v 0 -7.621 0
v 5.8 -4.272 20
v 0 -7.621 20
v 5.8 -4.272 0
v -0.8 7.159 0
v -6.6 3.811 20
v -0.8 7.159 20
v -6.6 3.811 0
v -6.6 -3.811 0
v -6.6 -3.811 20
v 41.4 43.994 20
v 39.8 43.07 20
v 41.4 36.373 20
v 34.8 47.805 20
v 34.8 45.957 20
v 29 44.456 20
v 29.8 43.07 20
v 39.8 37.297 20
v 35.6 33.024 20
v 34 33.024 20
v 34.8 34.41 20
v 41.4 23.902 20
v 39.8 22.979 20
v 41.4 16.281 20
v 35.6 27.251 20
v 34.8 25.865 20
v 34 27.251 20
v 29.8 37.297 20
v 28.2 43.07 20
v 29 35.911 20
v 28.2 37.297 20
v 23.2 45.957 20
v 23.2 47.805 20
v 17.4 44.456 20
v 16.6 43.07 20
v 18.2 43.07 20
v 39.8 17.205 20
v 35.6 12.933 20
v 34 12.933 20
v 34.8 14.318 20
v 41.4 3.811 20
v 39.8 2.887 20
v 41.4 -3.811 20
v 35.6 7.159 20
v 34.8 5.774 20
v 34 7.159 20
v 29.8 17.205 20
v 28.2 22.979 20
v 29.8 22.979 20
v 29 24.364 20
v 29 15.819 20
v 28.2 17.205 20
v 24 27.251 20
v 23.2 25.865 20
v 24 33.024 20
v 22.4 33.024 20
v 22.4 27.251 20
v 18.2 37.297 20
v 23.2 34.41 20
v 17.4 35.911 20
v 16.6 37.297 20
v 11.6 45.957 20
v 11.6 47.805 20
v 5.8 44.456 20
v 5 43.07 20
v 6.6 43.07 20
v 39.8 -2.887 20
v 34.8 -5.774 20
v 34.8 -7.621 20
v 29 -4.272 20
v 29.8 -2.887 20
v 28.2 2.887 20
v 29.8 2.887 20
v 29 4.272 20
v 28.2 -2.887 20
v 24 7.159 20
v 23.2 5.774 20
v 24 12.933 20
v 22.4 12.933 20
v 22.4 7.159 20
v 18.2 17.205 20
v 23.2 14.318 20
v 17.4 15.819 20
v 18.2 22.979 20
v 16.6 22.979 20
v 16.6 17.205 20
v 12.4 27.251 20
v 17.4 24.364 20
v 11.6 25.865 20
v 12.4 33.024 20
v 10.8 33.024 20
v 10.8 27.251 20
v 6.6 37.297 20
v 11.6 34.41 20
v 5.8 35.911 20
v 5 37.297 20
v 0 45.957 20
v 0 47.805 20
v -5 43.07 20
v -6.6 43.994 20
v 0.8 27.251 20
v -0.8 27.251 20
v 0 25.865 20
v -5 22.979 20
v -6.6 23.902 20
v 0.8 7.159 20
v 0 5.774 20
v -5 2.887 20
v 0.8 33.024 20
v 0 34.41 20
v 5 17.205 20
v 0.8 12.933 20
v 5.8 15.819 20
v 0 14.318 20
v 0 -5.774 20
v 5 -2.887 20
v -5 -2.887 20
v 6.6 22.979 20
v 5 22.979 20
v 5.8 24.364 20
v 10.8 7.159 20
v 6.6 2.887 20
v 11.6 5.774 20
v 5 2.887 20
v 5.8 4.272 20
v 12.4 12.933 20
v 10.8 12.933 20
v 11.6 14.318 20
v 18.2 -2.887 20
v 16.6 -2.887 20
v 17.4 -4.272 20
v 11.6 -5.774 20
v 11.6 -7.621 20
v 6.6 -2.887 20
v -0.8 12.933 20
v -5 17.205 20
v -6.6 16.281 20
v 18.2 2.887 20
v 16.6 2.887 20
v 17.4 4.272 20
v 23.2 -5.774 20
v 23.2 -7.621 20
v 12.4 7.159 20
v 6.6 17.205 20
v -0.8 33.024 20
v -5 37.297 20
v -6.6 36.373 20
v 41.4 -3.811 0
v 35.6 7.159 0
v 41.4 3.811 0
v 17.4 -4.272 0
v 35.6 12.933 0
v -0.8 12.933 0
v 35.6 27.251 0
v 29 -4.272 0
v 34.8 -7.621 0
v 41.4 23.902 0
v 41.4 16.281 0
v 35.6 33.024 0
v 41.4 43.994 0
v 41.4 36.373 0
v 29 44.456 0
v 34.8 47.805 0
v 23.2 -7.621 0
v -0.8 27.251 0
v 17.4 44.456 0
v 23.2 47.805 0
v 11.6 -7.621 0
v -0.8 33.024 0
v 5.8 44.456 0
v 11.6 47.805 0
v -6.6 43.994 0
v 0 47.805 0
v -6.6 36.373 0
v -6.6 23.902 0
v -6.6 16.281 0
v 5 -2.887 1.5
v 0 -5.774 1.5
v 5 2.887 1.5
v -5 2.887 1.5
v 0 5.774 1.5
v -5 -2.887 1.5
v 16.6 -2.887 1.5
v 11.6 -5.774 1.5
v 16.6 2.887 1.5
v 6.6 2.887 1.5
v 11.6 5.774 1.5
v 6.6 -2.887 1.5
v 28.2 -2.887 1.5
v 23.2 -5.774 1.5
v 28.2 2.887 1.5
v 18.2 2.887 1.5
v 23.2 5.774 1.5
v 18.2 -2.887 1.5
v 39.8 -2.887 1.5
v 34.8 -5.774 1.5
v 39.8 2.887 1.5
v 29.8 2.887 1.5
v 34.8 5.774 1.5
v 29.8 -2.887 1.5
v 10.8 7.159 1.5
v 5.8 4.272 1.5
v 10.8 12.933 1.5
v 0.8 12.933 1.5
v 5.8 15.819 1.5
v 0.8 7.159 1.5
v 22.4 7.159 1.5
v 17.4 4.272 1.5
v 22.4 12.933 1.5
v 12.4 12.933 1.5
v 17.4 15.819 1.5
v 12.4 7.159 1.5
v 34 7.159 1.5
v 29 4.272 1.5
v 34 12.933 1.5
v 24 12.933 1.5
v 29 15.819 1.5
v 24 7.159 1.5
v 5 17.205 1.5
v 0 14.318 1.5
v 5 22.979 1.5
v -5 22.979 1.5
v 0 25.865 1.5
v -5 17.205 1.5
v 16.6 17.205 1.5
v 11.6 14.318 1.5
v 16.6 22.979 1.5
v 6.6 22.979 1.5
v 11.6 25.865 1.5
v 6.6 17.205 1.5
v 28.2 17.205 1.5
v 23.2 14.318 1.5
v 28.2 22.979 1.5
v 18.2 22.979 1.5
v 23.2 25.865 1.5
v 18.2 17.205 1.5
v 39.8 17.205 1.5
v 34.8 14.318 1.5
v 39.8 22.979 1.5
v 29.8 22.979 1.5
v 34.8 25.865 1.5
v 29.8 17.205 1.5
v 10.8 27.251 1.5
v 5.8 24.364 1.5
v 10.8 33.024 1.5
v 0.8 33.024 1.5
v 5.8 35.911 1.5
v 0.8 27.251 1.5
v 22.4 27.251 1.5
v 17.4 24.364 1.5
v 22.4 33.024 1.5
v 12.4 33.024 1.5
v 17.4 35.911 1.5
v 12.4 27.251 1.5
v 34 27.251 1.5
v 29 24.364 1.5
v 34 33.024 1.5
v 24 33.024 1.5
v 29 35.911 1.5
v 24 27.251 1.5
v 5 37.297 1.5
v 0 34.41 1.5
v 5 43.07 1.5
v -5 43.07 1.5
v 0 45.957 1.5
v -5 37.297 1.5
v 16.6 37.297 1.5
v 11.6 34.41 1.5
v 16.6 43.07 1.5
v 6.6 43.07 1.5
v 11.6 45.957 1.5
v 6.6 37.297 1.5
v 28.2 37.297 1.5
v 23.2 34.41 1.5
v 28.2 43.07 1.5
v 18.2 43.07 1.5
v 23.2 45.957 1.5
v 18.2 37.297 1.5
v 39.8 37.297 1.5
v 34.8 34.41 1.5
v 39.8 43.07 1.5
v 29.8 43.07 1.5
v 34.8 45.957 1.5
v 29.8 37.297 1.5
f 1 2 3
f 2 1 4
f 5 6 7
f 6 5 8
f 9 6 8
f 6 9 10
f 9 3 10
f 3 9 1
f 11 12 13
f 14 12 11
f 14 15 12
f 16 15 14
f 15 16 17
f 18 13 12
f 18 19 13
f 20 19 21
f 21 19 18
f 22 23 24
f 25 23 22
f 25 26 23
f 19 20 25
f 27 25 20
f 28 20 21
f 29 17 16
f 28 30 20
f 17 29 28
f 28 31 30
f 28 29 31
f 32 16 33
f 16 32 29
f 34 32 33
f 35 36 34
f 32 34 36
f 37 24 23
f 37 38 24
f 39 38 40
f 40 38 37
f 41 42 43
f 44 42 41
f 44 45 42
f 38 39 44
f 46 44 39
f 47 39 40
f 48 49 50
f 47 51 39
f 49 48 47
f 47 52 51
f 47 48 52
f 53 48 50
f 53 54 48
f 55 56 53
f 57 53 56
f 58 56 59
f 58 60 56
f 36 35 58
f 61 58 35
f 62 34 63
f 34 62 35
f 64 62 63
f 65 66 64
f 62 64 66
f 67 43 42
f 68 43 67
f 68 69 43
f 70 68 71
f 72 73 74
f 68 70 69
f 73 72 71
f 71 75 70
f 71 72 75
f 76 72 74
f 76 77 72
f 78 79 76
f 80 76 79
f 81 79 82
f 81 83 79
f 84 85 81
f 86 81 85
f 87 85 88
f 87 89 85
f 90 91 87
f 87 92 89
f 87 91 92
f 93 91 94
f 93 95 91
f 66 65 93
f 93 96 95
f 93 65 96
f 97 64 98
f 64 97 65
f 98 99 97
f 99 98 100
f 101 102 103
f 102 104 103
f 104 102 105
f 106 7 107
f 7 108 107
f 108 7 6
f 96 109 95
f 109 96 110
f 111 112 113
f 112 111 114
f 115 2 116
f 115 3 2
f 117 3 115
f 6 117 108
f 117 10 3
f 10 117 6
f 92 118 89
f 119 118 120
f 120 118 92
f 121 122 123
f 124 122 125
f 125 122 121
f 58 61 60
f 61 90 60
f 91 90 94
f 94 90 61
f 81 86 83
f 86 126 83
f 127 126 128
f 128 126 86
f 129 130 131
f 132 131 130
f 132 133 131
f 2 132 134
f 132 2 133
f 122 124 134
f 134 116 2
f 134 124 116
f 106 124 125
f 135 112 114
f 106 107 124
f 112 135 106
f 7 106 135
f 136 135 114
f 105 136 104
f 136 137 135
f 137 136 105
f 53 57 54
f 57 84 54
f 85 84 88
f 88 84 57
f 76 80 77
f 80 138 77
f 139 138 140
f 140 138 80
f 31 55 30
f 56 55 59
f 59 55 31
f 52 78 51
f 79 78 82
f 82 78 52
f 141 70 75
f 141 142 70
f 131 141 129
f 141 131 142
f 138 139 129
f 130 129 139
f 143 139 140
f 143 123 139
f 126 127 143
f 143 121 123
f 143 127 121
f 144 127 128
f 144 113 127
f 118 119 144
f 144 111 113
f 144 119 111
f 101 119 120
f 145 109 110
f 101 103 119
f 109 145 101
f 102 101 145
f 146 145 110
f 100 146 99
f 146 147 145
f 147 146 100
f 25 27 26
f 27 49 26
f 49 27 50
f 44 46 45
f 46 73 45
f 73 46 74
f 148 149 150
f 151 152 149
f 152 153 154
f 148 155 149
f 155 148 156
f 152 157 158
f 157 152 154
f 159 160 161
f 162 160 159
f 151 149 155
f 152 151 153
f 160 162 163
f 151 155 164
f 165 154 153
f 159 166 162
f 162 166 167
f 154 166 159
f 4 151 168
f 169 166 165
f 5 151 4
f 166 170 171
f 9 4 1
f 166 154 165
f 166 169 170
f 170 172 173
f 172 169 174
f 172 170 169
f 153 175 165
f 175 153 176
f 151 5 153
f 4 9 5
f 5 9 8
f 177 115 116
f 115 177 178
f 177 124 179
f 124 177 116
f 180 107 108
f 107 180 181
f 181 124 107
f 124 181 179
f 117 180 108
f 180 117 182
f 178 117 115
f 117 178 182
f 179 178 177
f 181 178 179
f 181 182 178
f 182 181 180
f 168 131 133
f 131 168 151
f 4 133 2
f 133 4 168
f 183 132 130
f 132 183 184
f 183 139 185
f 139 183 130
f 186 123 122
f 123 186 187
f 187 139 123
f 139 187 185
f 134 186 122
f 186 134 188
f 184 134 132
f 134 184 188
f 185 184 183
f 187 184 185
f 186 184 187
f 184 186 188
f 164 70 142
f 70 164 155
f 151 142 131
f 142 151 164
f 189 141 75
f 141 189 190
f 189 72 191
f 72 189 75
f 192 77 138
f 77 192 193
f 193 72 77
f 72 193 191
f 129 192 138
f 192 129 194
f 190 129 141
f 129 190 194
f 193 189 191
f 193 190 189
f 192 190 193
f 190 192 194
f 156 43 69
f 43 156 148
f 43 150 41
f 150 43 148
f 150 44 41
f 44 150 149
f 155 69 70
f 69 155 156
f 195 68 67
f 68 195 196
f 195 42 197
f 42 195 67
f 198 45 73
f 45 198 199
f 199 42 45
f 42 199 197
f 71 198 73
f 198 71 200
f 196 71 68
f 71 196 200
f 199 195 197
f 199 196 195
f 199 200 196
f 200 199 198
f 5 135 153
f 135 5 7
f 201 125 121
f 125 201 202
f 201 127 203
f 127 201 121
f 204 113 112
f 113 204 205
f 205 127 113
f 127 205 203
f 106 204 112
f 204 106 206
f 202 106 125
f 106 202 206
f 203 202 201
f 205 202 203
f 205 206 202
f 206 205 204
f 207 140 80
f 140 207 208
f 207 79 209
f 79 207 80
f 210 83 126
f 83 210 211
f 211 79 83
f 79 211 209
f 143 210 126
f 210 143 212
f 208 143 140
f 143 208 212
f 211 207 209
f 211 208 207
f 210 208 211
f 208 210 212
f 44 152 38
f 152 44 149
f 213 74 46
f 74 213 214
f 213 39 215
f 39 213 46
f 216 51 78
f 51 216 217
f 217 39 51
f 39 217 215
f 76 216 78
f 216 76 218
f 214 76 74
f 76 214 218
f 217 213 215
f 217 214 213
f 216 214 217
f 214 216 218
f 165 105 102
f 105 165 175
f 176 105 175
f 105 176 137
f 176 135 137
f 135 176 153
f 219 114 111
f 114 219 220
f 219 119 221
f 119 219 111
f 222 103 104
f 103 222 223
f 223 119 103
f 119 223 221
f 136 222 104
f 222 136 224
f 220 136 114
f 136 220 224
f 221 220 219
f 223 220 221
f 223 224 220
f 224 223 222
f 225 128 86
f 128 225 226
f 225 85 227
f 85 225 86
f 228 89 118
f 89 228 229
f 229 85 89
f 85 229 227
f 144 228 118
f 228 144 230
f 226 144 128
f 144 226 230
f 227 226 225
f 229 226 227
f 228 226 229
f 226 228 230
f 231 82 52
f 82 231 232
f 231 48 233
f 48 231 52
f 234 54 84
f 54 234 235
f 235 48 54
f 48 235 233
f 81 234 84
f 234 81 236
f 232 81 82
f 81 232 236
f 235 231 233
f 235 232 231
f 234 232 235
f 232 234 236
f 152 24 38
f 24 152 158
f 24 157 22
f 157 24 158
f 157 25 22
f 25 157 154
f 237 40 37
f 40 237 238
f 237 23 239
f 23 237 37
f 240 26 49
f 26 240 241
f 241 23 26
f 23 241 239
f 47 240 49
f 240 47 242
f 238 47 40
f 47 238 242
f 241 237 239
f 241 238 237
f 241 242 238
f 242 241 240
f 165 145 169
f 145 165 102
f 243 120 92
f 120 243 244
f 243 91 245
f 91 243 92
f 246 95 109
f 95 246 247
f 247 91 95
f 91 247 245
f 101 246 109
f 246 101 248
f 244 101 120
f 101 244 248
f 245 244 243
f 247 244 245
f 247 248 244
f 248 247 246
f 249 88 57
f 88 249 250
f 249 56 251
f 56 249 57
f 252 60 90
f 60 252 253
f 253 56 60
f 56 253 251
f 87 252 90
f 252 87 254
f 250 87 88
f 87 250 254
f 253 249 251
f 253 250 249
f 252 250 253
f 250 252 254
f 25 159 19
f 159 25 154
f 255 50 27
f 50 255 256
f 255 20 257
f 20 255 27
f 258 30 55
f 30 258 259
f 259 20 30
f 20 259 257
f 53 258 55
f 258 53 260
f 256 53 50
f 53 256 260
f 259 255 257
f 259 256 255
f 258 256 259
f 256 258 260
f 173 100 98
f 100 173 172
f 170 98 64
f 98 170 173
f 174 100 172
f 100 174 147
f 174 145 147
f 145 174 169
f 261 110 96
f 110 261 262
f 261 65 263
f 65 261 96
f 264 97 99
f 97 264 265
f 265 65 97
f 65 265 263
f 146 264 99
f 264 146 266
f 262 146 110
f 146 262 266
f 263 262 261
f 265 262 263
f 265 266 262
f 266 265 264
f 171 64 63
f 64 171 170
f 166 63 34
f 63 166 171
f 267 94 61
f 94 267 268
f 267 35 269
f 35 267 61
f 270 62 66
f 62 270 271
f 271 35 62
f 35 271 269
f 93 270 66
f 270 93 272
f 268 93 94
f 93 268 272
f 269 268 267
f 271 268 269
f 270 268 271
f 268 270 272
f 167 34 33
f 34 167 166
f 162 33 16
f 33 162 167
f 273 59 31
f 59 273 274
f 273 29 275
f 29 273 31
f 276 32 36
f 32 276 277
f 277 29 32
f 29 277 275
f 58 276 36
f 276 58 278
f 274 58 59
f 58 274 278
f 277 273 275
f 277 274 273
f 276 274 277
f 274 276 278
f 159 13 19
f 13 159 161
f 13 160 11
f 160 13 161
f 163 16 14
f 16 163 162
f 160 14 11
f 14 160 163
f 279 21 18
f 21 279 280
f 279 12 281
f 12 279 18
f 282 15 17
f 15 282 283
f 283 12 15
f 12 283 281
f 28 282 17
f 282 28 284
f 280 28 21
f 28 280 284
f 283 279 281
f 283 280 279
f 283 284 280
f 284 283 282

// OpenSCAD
//Draw a Honeycomb grid based on 8 variables
//By: David Bunch 3/12/15

//Made more customizable 8/24/2016

//1. Face to Face Inside Distance of Honeycomb
ID = 10;            //Diameter from Face to Face or inscribed circle

//2. Total Height of Honeycomb
Ht = 20;            //Height of Outside of Honeycomb
                    //Height inside will be = Ht-Thk

//3. Thickness of wall between Honeycombs
W_Thk = 1.6;        //Thickness of Walls

//4. Thickness of Base of Honeycomb
B_Thk = 1.5;        //Thicknes of Base

//5. Number of Rows of Honeycomb
Rows = 5;           //[1:20]

//6. Number of Columns of Honeycomb
Cols = 4;           //[1:20]

//7. Honeycomb Pattern Style
P_Style = 0;        //[0:2]
                    //0= Every other row has 1 less Containers
                    //1 = Every other row has same number of containers
                    //2 = Every other row has 1 more container
//8. Open Tray (Only works with P_Style = 0)
Open_Tray = 0;           //[0:1]
                    
/* [Hidden] */

W_Thk2 = W_Thk / 2;                 //Half the Wall Thickness
OD_Face = ID + W_Thk + W_Thk;       //Outside Face to Face Dimension
OD_Face2 = OD_Face / 2;             //Half Outside Face to Face Dimension
Face2 = tan(30) * OD_Face2;
Yoffset = (OD_Face2 - W_Thk2) / tan(30);  //Y distance between Hex in Next Row
Xoffset = OD_Face2 - W_Thk2;        //X distance between Hex in Next Row
Rad = OD_Face2 / cos(30);           //Radius of Outside Face Width
RadID = (ID / 2) / cos(30);         //Radius of Inside Face Width
RadID2 = RadID / 2;
OD_W = (W_Thk * 2) / cos(30);       //Diameter of Wall Thickness
Rad_W = OD_W / 2;                   //Radius of Wall Thickness
Rad_W2 = Rad_W / 2;                 //Half the Radius Wall Thickness
X_Space = Xoffset * 2;
LenCut = (Cols - 1) * X_Space;
WidCut = (Rows) * Yoffset - W_Thk - RadID2;

echo(ID = ID);
echo(Ht = Ht);
echo(W_Thk = W_Thk);
echo(B_Thk = B_Thk);
echo(Rows = Rows);
echo(Cols = Cols);
echo(OD_Face = OD_Face);
echo(OD_Face2 = OD_Face2);
echo(Face2 = Face2);
echo(Xoffset = Xoffset);
echo(Yoffset = Yoffset);
echo(Rad = Rad);
echo(RadID = RadID);
echo(RadID2 = RadID2);
echo(OD_W = OD_W);
echo(Rad_W = Rad_W);
echo(WidCut = WidCut);
module Hex()
{
    rotate([0,0,30])
    difference()
    {
        cylinder(d=Rad*2,h=Ht,$fn=6);
        if (B_Thk > 0)
        {
            translate([0,0,B_Thk])
            cylinder(d=RadID * 2,h=Ht+2,$fn=6);
        } else
        {
            translate([0,0,-1])
            cylinder(d=RadID * 2,h=Ht + 2,$fn=6);
        }
    }
}
module WallHex()
{
    rotate([0,0,30])
    cylinder(d=OD_W,h=Ht + 2,$fn=6);
}
module HexRowCol()
{
    for (j=[0:Rows - 1])
    {
        A_Odd = j % 2;
        translate([(j % 2) * Xoffset,j * Yoffset,0])
        {
            if (P_Style == 2 && A_Odd == 1)
            {
                translate([-X_Space,0,0])
                Hex();              //Add extra hex to the left on Odd Rows
            }
            for (i=[0:Cols - 1])
            {
                translate([X_Space * i,0,0])
                Hex();
            }
        }
    }
}
module HexRowCol0()
{
    for (j=[0:Rows - 1])
    {
        A_Odd = j % 2;
        //echo(A_Odd = A_Odd);
        translate([(j % 2) * Xoffset,j * Yoffset,0])
        for (i=[0:Cols - 1])
        {
            if (j%2 == 0)
            {
                translate([X_Space * i,0,0])
                Hex();
            } else {
                if (i != (Cols - 1))
                {
                    translate([X_Space * i,0,0])
                    Hex();
                } 
            }
        }
    } 
}
module TrayCut()
{
    for (j=[0:Rows - 1])
    {
        A_Odd = j % 2;
        translate([(j % 2) * Xoffset,j * Yoffset,0])
        {
            if (A_Odd == 0)
            {
                if (j == 0)
                {
                    translate([0,-RadID2,B_Thk])
                    cube([LenCut,RadID + RadID2,Ht + 2]);
                } else  if (j == (Rows - 1))
                {
                    translate([0,-RadID,B_Thk])
                    cube([LenCut,RadID + RadID2,Ht + 2]);
                } else
                {
                    translate([0,-RadID,B_Thk])
                    cube([LenCut,RadID + RadID,Ht + 2]);
                }
                if (j < (Rows - 1))
                {
                translate([W_Thk,RadID - Rad_W2,B_Thk])
                WallHex();                 //Top Left Cleanup of this Row
                translate([LenCut - W_Thk,RadID - Rad_W2,B_Thk])
                WallHex();                 //Top Right Cleanup of this Row
                }
            } else
            {
                translate([W_Thk2 - Xoffset,RadID - Rad_W2 + W_Thk2,B_Thk])
                WallHex();      //Bottom Left cleanup of this Row
            
                translate([LenCut - W_Thk2 - Xoffset,RadID - Rad_W2 + W_Thk2,B_Thk])
                WallHex();      //Bottom Right cleanup of this Row
            }
        }
    } 
    translate([W_Thk2,-RadID2,B_Thk])
    cube([LenCut - W_Thk,WidCut,Ht + 2]);
}
difference()
{
    if (P_Style == 0)
    {
        HexRowCol0();

    } else
    {
        HexRowCol();
    }
    if (P_Style == 0 && Open_Tray == 1)
    {
        TrayCut();
    }
//Uncomment the next 2 lines to cut section thru 1st Hex
//    translate([-ID,-ID,-1])
//    cube([ID,ID,Ht + 2]);
}
